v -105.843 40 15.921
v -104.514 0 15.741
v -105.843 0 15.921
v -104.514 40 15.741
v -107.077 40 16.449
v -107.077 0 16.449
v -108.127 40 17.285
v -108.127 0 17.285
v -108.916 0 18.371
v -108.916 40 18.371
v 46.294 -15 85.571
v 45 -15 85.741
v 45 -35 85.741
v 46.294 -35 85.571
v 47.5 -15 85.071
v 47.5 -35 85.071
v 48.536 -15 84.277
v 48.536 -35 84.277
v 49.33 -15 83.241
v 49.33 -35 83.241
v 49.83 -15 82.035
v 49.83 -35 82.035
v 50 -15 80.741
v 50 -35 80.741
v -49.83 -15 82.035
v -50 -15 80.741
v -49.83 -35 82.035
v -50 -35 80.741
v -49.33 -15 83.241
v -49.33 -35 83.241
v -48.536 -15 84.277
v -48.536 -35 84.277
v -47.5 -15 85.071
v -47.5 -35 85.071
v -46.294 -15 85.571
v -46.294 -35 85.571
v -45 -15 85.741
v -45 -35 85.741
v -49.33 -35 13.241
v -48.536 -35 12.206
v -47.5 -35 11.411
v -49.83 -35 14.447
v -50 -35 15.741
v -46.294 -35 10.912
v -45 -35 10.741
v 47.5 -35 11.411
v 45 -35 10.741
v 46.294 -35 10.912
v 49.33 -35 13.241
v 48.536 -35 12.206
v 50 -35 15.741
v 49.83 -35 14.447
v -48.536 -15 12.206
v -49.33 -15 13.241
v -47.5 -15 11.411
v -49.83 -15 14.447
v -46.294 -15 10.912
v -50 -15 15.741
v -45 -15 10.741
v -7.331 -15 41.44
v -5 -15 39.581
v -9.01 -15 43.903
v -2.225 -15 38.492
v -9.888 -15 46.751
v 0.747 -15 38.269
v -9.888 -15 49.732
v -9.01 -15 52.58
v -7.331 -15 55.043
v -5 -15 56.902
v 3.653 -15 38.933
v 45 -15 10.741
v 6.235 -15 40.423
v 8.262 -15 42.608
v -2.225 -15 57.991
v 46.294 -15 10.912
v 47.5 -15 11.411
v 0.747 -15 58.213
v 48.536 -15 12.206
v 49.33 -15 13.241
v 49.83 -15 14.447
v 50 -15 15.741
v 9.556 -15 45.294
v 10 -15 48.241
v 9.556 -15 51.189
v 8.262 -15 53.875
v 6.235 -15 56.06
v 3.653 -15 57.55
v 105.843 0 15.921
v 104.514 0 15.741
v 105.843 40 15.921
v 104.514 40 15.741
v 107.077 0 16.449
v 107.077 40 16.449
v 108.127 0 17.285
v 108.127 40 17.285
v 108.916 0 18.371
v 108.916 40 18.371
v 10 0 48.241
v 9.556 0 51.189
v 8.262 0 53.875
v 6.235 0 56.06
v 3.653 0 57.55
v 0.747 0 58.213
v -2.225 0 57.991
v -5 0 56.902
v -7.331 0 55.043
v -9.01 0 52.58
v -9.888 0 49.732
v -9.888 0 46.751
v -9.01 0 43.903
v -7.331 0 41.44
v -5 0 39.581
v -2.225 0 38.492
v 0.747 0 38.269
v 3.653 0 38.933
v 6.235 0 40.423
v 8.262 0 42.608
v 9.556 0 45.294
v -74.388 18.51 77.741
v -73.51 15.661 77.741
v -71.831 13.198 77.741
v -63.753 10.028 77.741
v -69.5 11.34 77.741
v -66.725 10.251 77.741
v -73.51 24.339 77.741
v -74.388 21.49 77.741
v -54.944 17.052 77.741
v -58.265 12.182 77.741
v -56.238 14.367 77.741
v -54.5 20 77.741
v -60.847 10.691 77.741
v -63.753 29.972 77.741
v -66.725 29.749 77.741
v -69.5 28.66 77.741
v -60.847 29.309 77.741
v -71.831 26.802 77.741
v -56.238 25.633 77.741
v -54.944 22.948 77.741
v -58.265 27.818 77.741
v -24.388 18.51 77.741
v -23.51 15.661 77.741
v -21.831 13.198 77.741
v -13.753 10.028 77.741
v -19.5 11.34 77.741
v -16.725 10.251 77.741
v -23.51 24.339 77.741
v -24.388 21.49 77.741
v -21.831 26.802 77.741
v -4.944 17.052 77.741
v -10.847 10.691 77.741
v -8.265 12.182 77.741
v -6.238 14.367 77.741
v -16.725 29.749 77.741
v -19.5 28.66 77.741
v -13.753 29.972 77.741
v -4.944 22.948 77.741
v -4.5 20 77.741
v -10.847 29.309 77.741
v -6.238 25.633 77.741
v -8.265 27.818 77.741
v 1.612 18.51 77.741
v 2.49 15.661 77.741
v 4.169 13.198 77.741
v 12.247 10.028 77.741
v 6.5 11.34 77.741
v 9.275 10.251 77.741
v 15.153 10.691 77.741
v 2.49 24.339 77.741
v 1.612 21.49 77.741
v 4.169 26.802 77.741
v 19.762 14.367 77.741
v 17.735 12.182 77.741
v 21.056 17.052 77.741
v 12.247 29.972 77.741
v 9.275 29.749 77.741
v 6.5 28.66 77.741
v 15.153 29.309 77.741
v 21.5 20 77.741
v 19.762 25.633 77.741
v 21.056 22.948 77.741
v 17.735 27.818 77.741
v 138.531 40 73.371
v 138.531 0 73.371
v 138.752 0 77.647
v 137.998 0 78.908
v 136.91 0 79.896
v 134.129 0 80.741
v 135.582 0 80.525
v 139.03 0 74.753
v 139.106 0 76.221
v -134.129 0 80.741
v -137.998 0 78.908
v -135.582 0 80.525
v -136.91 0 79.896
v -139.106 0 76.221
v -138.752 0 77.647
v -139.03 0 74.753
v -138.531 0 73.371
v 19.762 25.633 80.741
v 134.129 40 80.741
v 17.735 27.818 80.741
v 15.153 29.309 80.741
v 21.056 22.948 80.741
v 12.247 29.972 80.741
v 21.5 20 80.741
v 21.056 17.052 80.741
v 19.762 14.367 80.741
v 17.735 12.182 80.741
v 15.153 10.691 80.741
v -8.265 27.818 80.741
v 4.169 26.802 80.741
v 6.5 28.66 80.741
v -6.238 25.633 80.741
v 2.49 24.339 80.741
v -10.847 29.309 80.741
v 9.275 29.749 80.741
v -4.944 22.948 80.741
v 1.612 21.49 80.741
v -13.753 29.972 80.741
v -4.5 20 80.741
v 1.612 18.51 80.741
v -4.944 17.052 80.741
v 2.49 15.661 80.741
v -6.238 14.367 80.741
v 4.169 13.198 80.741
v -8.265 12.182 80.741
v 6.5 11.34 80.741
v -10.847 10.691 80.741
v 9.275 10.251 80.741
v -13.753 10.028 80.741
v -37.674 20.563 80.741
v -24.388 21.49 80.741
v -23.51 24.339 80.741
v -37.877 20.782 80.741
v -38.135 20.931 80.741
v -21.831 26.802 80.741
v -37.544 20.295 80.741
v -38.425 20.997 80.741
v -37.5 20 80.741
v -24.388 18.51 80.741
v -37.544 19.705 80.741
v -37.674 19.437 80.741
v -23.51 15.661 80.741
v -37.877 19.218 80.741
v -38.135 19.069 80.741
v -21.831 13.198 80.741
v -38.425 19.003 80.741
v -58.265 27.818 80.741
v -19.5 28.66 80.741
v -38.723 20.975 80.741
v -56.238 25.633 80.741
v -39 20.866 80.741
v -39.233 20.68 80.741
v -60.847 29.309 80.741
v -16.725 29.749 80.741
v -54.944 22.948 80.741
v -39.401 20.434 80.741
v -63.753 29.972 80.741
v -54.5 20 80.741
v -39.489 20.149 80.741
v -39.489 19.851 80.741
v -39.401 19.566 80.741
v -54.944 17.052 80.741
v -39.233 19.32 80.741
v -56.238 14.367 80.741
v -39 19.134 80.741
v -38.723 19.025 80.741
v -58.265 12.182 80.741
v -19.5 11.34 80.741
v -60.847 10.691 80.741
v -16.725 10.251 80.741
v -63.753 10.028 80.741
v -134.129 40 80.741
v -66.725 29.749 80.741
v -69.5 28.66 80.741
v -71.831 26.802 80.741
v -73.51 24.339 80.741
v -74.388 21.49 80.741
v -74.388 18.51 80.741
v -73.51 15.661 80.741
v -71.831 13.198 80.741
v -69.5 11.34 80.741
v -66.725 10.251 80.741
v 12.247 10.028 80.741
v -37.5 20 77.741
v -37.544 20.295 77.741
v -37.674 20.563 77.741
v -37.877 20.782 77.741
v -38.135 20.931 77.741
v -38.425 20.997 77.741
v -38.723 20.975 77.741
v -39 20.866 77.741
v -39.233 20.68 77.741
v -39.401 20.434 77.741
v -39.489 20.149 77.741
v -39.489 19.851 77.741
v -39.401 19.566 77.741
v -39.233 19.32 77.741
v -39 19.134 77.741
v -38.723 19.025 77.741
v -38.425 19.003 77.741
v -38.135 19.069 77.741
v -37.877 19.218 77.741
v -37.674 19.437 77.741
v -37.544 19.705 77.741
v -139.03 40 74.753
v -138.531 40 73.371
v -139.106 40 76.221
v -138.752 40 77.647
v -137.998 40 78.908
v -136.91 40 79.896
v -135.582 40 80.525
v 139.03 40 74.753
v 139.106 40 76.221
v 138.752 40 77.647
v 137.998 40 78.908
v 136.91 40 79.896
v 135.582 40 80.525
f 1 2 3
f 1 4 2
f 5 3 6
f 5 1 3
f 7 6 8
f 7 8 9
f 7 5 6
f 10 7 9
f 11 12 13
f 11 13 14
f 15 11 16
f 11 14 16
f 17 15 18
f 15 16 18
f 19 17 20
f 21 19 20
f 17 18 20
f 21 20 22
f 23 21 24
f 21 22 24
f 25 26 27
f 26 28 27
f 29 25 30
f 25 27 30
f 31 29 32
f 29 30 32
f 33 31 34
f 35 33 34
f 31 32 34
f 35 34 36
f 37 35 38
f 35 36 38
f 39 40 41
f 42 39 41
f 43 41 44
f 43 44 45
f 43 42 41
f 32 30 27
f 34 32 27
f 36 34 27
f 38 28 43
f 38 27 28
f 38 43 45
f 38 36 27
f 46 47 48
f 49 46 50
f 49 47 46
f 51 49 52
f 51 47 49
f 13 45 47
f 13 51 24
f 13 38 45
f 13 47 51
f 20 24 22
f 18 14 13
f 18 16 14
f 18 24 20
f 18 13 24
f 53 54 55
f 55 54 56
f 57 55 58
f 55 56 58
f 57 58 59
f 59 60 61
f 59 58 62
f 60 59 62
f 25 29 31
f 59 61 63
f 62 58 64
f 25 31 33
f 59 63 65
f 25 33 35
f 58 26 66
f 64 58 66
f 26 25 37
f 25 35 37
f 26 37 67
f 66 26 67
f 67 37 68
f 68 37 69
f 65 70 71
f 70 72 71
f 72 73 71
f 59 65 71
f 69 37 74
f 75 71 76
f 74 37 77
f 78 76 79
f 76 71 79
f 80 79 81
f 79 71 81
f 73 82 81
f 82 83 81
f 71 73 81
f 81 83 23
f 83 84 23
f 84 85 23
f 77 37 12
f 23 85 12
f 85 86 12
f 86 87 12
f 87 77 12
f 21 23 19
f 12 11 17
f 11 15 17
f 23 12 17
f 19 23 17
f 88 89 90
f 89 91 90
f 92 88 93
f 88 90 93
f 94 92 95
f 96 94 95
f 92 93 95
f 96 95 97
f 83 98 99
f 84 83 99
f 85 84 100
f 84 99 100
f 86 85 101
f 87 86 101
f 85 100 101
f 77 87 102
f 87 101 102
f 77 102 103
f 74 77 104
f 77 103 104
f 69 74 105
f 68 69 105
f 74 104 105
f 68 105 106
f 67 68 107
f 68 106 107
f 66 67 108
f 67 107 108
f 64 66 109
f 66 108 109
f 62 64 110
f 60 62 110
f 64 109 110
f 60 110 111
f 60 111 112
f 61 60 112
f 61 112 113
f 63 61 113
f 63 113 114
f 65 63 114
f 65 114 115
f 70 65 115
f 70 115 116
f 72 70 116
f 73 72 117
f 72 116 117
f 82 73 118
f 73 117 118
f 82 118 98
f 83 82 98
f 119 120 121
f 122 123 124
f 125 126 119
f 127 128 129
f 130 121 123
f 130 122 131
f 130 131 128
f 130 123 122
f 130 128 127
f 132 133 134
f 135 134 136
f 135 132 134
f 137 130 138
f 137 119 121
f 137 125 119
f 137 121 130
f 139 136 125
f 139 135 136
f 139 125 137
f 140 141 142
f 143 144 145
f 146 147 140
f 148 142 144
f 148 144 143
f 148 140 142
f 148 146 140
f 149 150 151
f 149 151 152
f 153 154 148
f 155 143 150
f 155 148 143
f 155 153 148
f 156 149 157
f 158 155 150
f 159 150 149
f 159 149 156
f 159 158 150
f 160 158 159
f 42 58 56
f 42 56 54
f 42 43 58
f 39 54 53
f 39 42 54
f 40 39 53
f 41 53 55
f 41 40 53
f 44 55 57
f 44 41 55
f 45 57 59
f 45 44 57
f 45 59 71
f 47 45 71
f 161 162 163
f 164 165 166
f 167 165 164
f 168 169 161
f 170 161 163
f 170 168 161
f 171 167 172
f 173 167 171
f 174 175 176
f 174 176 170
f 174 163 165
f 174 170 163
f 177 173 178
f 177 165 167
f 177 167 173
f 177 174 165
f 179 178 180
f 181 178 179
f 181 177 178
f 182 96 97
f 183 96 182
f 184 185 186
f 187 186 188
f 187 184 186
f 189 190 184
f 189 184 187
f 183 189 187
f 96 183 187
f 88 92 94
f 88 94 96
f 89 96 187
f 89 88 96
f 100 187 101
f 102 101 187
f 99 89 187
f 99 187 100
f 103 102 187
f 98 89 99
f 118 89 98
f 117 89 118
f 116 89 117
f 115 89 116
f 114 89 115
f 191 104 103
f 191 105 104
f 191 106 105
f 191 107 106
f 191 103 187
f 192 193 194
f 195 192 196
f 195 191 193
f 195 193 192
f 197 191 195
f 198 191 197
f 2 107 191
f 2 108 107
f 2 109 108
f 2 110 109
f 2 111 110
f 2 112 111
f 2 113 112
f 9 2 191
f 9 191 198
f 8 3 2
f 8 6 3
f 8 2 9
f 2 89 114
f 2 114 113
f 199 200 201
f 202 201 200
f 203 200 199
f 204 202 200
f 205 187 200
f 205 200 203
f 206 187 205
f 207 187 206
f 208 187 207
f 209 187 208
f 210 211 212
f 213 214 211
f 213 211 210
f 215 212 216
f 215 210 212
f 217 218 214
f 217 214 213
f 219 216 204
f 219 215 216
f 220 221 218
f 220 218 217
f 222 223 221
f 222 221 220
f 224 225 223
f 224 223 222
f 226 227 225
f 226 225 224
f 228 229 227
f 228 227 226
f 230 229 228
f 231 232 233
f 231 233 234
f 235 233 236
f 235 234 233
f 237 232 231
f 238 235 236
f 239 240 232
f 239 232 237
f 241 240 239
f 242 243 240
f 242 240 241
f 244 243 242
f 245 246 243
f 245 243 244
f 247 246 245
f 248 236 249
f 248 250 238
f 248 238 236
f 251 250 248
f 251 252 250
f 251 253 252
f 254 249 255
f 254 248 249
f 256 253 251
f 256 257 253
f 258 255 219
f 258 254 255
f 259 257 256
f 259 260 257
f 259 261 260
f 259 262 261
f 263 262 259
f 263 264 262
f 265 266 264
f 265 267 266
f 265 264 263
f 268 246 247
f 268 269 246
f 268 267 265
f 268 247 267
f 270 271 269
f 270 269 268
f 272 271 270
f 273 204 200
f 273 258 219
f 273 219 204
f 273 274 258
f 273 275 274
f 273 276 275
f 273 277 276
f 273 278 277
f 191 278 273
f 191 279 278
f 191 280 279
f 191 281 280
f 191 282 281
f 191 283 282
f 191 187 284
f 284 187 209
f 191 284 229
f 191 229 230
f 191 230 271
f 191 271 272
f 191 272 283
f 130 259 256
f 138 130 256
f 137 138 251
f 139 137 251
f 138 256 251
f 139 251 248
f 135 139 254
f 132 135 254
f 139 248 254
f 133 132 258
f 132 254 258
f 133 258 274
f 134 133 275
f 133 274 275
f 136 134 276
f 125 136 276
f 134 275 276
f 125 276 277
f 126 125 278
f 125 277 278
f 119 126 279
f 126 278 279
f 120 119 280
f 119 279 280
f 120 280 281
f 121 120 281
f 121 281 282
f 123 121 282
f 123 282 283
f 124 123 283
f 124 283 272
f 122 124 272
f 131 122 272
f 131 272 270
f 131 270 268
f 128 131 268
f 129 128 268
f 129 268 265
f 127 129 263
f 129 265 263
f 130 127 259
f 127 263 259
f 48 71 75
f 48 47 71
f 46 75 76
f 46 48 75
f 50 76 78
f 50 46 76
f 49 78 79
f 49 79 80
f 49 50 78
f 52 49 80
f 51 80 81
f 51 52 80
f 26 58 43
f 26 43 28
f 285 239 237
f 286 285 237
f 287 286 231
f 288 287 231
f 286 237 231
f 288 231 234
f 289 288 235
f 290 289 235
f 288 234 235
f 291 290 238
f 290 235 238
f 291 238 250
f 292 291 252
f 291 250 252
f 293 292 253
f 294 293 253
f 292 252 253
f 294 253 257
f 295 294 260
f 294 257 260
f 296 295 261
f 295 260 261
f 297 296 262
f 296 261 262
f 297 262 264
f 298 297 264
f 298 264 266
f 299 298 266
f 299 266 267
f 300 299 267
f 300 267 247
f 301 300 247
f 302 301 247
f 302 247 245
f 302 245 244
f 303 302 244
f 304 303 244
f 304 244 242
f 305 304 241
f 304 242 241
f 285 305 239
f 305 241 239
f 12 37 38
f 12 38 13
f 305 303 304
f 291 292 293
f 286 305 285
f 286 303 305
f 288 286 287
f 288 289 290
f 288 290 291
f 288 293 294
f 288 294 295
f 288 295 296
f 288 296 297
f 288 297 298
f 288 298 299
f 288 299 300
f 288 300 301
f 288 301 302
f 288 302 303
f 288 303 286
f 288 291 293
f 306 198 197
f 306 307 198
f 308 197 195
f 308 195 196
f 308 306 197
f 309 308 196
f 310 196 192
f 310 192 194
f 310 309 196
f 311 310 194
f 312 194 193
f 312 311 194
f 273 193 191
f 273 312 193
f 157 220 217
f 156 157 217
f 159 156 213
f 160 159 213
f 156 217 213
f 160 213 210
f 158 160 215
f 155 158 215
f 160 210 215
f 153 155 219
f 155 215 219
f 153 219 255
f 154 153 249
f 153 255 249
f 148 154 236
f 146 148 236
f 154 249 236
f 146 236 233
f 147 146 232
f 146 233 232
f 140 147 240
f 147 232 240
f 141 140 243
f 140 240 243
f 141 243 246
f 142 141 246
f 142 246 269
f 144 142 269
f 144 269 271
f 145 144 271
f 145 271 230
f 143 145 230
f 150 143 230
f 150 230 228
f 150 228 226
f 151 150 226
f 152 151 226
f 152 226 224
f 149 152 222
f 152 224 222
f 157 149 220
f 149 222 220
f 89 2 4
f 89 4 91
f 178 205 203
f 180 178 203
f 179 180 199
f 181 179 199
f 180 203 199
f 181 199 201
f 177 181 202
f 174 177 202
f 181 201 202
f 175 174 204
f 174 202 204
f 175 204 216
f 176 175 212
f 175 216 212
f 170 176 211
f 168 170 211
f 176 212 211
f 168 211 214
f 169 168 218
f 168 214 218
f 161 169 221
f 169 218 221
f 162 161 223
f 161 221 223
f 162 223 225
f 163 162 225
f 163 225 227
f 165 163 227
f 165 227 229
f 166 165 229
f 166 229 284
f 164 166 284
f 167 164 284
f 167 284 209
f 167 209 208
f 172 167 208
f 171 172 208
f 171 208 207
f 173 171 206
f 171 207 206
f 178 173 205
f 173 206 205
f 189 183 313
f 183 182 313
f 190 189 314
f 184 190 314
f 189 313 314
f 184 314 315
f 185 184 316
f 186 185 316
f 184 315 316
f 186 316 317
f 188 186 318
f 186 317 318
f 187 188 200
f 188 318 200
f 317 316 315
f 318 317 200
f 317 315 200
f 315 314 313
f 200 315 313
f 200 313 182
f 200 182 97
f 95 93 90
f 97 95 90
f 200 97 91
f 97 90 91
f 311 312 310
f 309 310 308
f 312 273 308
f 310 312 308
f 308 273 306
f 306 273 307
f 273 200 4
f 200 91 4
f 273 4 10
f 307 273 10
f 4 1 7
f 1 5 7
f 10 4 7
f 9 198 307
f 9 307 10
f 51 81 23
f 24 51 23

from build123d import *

# Parameters (mm, degrees)
BOSS_EXTRUDE1_DEPTH = 40
SKETCH3_R           = 10
SKETCH3_R_2         = 1
CUT_EXTRUDE1_DEPTH  = 3
SKETCH8_R           = 10
BOSS_EXTRUDE2_DEPTH = 15
SKETCH9_W           = 100
SKETCH9_H           = 75
BOSS_EXTRUDE3_DEPTH = 20
FILLET2_R           = 5
FILLET3_R           = 5


with BuildPart() as part:
    # Sketch2 → Boss-Extrude1 (new body)
    with BuildSketch(Plane(origin=(0, 0, 0), x_dir=(1, 0, 0), z_dir=(0, 1, 0))):
        Polygon((-107.5, -15.741355231), (107.5, -15.741355231), (142.5, -80.741355231), (-142.5, -80.741355231), align=None)
    extrude(amount=BOSS_EXTRUDE1_DEPTH)

    # Sketch3 → Cut-Extrude1 (cut)
    with BuildSketch(Plane.XY.offset(80.741355231)):
        with Locations((-64.5, 20)):
            Circle(SKETCH3_R)
        with Locations((-38.5, 20)):
            Circle(SKETCH3_R_2)
        with Locations((-14.5, 20)):
            Circle(SKETCH3_R)
        with Locations((11.5, 20)):
            Circle(SKETCH3_R)
    extrude(amount=-CUT_EXTRUDE1_DEPTH, mode=Mode.SUBTRACT)

    # Sketch8 → Boss-Extrude2 (add)
    with BuildSketch(Plane.XZ):
        with Locations((0, 48.241355231)):
            Circle(SKETCH8_R)
    extrude(amount=BOSS_EXTRUDE2_DEPTH)

    # Sketch9 → Boss-Extrude3 (add)
    with BuildSketch(Plane.XZ.offset(15)):
        with Locations((0, 48.241355231)):
            Rectangle(SKETCH9_W, SKETCH9_H)
    extrude(amount=BOSS_EXTRUDE3_DEPTH)

    # Fillet2
    fillet2_edges = [part.edges().sort_by_distance(p)[0] for p in [
        (-142.5, 20, 80.741355231),
        (-107.5, 20, 15.741355231),
        (107.5, 20, 15.741355231),
        (142.5, 20, 80.741355231),
    ]]
    fillet(fillet2_edges, radius=FILLET2_R)

    # Fillet3
    fillet3_edges = [part.edges().sort_by_distance(p)[0] for p in [
        (50, -25, 10.741355231),
        (50, -25, 85.741355231),
        (-50, -25, 85.741355231),
        (-50, -25, 10.741355231),
    ]]
    fillet(fillet3_edges, radius=FILLET3_R)


solid = part.part
